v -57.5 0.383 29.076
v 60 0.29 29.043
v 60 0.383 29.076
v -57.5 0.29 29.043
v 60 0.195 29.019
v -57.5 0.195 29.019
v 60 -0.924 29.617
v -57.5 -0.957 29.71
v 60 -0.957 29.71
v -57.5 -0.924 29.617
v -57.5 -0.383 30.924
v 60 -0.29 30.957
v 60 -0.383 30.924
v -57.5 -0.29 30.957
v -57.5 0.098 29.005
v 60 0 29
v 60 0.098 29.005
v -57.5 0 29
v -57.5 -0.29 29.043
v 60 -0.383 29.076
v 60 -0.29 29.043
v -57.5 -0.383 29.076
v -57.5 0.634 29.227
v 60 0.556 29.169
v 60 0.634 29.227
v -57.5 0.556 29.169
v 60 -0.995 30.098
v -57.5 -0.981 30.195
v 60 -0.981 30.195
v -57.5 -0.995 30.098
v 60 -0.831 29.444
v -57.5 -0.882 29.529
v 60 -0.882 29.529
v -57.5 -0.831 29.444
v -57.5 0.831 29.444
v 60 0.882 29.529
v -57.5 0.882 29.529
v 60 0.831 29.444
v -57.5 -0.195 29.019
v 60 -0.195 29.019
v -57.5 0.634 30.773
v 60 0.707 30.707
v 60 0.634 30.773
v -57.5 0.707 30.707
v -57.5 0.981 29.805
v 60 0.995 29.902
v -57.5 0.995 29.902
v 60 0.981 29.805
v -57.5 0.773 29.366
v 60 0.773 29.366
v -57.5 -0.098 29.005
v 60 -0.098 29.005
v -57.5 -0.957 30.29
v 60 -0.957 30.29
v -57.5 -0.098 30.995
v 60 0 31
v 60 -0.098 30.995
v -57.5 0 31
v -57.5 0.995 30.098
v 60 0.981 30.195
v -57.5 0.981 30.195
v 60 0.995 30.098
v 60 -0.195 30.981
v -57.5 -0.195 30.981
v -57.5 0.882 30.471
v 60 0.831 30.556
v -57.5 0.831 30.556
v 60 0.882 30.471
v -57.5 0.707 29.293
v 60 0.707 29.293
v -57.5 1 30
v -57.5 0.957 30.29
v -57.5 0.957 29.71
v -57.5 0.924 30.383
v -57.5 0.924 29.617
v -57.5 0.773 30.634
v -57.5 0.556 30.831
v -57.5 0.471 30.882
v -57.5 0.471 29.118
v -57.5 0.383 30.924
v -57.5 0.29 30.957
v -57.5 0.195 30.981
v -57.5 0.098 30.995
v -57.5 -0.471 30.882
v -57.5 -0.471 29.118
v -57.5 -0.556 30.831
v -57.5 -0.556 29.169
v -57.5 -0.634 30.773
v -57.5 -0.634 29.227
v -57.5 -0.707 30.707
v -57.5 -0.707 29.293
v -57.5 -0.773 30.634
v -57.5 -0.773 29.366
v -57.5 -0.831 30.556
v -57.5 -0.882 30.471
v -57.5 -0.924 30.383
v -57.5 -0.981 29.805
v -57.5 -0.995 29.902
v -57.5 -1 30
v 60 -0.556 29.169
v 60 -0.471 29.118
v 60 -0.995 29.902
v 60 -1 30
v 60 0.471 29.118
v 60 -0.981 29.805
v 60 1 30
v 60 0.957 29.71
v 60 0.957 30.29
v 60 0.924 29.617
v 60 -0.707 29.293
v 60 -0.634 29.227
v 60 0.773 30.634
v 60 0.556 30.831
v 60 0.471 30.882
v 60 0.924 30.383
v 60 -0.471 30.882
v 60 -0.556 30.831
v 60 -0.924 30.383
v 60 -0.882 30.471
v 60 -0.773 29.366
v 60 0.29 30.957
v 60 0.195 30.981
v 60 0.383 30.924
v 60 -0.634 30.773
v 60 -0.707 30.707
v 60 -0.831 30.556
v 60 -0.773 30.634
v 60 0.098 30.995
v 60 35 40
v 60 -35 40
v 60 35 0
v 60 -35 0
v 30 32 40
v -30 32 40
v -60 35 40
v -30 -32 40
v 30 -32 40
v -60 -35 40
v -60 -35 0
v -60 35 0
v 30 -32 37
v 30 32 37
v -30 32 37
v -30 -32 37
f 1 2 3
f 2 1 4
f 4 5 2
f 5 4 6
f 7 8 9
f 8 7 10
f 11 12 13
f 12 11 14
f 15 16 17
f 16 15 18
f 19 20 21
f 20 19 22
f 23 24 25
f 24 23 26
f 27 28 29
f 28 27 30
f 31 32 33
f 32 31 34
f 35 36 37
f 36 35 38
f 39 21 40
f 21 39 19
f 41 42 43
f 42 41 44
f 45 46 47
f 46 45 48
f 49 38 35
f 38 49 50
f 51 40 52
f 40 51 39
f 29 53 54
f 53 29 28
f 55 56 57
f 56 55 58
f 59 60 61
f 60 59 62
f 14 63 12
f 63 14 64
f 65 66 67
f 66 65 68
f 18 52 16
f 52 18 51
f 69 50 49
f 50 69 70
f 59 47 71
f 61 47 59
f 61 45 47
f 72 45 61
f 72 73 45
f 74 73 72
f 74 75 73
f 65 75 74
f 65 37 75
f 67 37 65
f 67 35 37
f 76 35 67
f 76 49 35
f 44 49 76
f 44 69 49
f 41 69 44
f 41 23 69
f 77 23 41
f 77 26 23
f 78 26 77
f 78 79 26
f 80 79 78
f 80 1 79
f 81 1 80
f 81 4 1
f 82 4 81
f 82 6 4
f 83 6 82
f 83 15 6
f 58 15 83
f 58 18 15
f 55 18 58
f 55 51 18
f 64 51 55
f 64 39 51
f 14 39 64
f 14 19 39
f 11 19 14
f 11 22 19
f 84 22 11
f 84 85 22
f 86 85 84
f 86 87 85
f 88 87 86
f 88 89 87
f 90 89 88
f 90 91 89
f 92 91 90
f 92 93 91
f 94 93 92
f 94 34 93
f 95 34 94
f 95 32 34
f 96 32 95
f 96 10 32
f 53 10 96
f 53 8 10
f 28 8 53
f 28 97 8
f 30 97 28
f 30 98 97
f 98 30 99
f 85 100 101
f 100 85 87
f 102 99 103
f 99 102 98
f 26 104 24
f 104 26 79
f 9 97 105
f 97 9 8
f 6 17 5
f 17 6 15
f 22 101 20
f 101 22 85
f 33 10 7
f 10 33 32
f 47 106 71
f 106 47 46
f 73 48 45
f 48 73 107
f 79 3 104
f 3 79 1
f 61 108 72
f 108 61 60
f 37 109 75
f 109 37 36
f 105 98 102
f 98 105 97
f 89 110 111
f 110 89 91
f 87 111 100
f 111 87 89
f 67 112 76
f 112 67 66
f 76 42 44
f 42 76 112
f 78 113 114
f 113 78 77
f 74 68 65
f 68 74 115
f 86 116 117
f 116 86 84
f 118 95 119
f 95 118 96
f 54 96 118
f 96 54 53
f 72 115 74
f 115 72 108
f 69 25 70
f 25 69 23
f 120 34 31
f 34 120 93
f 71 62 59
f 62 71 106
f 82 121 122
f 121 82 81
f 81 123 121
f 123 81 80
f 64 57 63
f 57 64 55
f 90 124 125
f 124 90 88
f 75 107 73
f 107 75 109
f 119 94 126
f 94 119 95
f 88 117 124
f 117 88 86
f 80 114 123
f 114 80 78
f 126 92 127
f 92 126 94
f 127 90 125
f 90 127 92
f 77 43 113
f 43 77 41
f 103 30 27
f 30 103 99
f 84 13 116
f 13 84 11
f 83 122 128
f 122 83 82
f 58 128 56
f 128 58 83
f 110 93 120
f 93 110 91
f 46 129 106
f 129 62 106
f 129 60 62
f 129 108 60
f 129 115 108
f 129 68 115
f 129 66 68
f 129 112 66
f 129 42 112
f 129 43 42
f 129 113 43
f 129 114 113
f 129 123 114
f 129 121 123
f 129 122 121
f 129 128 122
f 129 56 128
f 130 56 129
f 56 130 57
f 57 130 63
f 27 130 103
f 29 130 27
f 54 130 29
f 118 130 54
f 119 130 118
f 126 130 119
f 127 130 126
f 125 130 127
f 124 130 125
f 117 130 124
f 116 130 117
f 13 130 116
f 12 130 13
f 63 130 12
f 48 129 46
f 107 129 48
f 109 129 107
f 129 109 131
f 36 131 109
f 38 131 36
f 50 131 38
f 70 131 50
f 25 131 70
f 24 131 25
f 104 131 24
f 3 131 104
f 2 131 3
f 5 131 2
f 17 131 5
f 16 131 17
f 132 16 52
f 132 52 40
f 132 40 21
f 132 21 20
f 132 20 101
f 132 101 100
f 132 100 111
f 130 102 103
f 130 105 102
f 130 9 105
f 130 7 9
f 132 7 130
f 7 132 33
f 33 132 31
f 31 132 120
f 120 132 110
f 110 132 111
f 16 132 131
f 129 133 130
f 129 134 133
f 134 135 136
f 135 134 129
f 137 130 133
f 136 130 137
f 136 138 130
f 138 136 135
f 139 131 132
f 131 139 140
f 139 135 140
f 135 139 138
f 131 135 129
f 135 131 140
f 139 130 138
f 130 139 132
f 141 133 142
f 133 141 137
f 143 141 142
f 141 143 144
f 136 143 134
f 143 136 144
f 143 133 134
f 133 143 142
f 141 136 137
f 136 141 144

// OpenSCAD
// Mini horizontal gel-electrophoresis box - buffer tank
// Print orientation: tank resting on its floor, open top facing up (+Z)

// ---------------- Parameters ----------------
tank_x      = 120;   // outer length along X (mm)
tank_y      = 70;    // outer width along Y (mm)
tank_z      = 40;    // outer height along Z (mm)

wall        = 3;     // wall thickness (mm)
floor       = 3;     // floor thickness (mm)

platform_x  = 60;    // platform length along X (mm), centred
platform_z  = 10;    // platform height above inner floor (mm) -> top at z = 13

hole_d      = 2;     // electrode hole diameter (mm)
hole_y      = 0;     // electrode hole Y position (mm)
hole_z      = 30;    // electrode hole Z position (mm)

eps         = 0.5;   // cutter overshoot past faces (mm)
$fn         = 64;    // curve resolution

// ---------------- Derived ----------------
inner_x = tank_x - 2 * wall;   // 114
inner_y = tank_y - 2 * wall;   // 64
inner_z = tank_z - floor;      // 37   // floor at z = 0, inner floor at z = 3

platform_top_z = inner_z + platform_z;  // 47 (absolute Z of platform top)

// ---------------- Model ----------------
difference() {
    // Main tank body (open top)
    translate([-tank_x / 2, -tank_y / 2, 0])
        cube([tank_x, tank_y, tank_z]);

    // Central raised platform for gel tray
    // Spans full inner width (Y), centred in X, top at z = 13 (relative to inner floor)
    translate([-platform_x / 2, -inner_y / 2, inner_z])
        cube([platform_x, inner_y, platform_z]);

    // Horizontal electrode holes through each end wall, along X
    for (sx = [-1, 1])
        translate([sx > 0 ? inner_x / 2 - eps : -inner_x / 2 - eps, hole_y, hole_z])
            rotate([0, 90, 0])
                cylinder(d = hole_d, h = tank_x + 2 * eps);
}
